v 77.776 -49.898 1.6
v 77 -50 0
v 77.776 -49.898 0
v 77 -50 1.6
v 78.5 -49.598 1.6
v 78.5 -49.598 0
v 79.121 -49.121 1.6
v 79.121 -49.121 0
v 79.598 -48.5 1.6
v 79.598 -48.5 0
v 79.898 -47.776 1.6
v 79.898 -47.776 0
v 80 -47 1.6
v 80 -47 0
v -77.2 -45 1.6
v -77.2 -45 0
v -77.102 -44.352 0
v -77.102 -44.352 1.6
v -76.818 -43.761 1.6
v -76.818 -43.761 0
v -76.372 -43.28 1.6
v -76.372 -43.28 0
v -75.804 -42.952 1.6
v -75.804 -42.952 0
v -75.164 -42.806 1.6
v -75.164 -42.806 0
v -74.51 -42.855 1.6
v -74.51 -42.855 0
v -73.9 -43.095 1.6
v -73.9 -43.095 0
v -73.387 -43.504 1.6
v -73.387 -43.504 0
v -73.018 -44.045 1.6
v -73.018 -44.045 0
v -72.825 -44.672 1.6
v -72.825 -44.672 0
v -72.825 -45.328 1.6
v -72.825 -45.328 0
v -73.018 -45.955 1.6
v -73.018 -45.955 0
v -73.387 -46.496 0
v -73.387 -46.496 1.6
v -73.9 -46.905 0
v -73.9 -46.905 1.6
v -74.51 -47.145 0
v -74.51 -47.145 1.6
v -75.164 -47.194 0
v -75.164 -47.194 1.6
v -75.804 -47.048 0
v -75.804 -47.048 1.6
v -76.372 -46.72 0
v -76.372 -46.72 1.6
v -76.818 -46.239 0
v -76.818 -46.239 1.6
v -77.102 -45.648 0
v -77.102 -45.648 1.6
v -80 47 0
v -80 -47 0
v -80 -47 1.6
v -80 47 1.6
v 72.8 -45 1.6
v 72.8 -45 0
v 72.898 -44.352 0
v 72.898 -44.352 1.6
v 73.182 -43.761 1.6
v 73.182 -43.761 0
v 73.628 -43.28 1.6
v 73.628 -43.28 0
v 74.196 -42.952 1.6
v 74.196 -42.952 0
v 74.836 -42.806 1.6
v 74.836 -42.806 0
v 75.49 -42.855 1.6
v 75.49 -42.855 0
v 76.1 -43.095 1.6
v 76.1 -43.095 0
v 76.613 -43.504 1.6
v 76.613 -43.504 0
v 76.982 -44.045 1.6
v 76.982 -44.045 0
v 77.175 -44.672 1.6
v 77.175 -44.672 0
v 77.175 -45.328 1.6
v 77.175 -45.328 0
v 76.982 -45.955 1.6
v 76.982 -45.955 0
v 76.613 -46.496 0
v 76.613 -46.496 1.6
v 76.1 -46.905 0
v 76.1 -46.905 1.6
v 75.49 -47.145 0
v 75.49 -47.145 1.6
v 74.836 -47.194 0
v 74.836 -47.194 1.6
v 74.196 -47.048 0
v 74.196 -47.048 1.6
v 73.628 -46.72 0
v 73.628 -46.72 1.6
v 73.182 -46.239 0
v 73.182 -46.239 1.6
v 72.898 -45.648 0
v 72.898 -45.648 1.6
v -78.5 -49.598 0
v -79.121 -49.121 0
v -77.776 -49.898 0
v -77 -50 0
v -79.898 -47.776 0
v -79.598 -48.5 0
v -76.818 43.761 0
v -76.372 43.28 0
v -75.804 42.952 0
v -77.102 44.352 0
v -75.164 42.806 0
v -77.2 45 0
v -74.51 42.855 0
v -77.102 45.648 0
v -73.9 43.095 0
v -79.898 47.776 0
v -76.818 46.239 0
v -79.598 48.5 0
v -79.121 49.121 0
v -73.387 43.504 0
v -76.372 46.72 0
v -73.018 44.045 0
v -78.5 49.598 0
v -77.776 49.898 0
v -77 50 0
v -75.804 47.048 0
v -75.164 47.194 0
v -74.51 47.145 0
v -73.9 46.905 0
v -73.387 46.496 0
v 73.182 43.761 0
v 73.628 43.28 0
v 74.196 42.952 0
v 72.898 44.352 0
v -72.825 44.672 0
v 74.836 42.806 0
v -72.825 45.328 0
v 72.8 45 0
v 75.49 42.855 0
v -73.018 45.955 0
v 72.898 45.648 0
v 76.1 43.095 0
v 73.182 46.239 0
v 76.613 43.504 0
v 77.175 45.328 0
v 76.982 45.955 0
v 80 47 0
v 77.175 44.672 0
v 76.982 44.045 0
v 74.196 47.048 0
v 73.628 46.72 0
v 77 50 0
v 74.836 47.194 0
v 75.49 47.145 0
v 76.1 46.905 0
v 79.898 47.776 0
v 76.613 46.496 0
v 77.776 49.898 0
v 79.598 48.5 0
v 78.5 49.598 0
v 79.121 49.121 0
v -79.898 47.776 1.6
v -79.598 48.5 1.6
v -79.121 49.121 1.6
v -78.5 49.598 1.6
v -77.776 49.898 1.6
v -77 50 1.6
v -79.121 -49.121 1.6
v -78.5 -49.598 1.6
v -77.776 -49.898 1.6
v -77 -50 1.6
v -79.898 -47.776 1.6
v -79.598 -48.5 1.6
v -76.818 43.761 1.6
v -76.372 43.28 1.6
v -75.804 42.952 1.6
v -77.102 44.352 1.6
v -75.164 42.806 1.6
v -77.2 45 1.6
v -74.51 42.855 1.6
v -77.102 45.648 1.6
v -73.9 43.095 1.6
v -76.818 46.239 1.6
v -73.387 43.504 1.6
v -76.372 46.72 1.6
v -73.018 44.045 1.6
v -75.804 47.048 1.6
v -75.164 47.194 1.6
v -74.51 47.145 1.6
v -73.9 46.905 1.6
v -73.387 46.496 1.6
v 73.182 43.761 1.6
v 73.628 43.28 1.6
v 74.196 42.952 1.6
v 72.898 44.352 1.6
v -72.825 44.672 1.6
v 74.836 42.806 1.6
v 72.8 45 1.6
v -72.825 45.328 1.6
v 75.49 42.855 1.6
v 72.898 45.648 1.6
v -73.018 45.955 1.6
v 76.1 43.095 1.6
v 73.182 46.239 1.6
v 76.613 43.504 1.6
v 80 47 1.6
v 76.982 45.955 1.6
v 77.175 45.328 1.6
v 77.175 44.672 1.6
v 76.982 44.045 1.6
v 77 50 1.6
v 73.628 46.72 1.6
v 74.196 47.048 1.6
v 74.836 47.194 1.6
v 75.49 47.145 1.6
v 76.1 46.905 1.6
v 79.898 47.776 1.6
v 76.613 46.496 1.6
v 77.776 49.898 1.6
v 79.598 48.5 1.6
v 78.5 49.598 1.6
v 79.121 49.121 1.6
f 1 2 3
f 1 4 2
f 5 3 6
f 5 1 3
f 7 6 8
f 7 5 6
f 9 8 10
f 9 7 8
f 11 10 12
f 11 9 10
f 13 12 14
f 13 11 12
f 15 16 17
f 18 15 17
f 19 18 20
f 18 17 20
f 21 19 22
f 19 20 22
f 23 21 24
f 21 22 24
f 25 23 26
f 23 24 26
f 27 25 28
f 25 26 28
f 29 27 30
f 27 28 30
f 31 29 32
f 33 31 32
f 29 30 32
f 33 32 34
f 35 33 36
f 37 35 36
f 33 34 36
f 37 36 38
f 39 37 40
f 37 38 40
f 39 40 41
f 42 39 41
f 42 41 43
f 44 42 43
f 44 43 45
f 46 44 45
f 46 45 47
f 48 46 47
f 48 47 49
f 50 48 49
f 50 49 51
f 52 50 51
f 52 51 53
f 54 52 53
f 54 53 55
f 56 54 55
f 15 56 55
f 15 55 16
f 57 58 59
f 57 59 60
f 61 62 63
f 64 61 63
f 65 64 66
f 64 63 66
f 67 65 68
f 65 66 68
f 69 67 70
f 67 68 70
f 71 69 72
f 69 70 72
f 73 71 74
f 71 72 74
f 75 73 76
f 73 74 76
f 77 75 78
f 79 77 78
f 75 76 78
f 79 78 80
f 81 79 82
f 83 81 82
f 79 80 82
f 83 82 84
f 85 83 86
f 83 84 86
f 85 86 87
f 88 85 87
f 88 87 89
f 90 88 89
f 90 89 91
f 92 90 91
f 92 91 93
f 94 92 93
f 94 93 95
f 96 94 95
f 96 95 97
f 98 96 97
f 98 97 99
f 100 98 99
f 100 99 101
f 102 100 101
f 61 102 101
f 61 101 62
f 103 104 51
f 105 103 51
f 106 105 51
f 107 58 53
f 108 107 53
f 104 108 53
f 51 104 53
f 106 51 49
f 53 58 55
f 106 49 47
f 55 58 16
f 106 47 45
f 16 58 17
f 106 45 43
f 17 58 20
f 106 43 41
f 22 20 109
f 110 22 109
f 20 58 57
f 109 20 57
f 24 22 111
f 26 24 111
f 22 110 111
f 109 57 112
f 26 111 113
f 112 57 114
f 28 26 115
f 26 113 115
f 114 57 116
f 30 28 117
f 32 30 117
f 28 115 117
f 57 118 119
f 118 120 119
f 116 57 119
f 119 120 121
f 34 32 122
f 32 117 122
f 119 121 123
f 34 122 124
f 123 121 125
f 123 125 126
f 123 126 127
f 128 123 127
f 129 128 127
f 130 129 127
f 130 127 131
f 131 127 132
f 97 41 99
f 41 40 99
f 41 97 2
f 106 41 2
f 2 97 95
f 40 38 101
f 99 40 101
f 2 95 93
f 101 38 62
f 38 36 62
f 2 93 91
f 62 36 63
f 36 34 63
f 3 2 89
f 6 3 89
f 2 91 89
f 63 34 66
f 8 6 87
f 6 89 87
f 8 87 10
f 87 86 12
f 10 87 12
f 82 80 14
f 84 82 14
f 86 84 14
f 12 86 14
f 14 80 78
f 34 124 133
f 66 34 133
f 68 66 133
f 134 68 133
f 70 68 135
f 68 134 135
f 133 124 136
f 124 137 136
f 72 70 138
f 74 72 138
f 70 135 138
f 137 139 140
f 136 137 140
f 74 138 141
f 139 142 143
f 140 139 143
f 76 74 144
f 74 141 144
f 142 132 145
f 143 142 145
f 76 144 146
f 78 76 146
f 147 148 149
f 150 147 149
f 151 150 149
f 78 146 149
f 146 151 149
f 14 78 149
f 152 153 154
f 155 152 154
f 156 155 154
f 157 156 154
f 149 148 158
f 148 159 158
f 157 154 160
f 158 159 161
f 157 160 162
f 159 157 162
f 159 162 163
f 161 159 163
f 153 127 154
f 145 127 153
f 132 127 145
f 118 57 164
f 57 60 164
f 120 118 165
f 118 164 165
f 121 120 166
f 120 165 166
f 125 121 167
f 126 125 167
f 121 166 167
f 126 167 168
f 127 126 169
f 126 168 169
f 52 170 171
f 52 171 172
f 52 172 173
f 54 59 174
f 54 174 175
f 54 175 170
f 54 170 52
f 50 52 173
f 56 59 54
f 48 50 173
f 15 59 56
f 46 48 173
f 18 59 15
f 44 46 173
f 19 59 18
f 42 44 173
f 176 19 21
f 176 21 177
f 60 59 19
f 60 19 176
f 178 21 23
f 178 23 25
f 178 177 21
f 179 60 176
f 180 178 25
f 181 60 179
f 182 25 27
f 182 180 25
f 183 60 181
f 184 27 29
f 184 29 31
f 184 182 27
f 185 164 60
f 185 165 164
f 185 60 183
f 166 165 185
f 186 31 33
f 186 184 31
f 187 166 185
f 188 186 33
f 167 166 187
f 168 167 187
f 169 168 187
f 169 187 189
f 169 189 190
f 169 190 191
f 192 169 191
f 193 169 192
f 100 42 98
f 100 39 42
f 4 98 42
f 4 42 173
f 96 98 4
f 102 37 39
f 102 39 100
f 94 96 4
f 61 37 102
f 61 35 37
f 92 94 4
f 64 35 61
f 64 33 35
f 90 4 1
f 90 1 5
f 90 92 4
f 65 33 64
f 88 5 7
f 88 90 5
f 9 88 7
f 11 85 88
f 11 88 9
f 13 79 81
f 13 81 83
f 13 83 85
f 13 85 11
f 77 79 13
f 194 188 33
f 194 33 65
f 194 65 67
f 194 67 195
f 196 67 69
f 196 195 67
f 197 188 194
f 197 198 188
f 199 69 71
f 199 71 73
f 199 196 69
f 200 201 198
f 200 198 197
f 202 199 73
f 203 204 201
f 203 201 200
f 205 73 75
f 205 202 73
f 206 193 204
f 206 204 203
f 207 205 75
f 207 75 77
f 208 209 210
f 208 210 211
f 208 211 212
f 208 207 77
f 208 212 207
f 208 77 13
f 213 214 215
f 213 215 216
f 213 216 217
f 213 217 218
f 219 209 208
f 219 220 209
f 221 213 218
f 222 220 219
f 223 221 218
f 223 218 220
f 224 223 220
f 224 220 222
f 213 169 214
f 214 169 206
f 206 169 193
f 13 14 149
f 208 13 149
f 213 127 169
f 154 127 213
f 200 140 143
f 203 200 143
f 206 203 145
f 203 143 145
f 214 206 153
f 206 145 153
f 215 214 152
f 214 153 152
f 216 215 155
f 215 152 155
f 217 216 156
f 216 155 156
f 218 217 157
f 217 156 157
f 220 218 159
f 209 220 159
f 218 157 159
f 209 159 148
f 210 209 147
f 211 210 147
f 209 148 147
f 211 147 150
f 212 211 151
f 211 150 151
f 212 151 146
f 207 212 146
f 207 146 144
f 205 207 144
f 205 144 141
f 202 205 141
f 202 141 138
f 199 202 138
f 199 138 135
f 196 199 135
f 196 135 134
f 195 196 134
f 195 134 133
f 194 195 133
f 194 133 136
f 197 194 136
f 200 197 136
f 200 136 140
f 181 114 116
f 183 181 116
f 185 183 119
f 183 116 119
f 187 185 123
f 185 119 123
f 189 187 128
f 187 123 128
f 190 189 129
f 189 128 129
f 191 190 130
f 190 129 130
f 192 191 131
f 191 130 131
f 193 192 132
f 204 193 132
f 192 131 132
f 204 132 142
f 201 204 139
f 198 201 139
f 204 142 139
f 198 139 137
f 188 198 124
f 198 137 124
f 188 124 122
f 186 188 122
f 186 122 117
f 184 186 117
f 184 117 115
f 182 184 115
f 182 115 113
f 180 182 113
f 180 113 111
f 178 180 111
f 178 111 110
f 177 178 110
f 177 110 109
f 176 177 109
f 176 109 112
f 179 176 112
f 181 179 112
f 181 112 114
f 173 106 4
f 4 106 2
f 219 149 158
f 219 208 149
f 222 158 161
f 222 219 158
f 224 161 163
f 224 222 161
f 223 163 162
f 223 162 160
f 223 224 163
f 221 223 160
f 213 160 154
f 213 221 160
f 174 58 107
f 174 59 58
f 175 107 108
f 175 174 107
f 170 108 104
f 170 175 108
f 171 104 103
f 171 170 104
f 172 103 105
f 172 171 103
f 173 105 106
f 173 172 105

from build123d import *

# Parameters (mm, degrees)
SKETCH_1_W             = 160
SKETCH_1_H             = 100
EXTRUDE_1_DEPTH        = 1.6
FILLET_1_R             = 3
HOLE_WIZARD_M3_1_D     = 4.4
HOLE_WIZARD_M3_1_DEPTH = 6


with BuildPart() as part:
    # ｽｹｯﾁ1 → ﾎﾞｽ - 押し出し1 (new body)
    with BuildSketch(Plane.XY):
        Rectangle(SKETCH_1_W, SKETCH_1_H)
    extrude(amount=EXTRUDE_1_DEPTH)

    # ﾌｨﾚｯﾄ1
    fillet_1_edges = [part.edges().sort_by_distance(p)[0] for p in [
        (-80, 50, 0.8),
        (80, 50, 0.8),
        (80, -50, 0.8),
        (-80, -50, 0.8),
    ]]
    fillet(fillet_1_edges, radius=FILLET_1_R)

    # M3 すきま穴1
    with Locations(Plane.XY.offset(1.6)):
        with Locations((-75, -45), (-75, 45), (75, 45), (75, -45)):
            Hole(HOLE_WIZARD_M3_1_D / 2, depth=HOLE_WIZARD_M3_1_DEPTH)


solid = part.part
